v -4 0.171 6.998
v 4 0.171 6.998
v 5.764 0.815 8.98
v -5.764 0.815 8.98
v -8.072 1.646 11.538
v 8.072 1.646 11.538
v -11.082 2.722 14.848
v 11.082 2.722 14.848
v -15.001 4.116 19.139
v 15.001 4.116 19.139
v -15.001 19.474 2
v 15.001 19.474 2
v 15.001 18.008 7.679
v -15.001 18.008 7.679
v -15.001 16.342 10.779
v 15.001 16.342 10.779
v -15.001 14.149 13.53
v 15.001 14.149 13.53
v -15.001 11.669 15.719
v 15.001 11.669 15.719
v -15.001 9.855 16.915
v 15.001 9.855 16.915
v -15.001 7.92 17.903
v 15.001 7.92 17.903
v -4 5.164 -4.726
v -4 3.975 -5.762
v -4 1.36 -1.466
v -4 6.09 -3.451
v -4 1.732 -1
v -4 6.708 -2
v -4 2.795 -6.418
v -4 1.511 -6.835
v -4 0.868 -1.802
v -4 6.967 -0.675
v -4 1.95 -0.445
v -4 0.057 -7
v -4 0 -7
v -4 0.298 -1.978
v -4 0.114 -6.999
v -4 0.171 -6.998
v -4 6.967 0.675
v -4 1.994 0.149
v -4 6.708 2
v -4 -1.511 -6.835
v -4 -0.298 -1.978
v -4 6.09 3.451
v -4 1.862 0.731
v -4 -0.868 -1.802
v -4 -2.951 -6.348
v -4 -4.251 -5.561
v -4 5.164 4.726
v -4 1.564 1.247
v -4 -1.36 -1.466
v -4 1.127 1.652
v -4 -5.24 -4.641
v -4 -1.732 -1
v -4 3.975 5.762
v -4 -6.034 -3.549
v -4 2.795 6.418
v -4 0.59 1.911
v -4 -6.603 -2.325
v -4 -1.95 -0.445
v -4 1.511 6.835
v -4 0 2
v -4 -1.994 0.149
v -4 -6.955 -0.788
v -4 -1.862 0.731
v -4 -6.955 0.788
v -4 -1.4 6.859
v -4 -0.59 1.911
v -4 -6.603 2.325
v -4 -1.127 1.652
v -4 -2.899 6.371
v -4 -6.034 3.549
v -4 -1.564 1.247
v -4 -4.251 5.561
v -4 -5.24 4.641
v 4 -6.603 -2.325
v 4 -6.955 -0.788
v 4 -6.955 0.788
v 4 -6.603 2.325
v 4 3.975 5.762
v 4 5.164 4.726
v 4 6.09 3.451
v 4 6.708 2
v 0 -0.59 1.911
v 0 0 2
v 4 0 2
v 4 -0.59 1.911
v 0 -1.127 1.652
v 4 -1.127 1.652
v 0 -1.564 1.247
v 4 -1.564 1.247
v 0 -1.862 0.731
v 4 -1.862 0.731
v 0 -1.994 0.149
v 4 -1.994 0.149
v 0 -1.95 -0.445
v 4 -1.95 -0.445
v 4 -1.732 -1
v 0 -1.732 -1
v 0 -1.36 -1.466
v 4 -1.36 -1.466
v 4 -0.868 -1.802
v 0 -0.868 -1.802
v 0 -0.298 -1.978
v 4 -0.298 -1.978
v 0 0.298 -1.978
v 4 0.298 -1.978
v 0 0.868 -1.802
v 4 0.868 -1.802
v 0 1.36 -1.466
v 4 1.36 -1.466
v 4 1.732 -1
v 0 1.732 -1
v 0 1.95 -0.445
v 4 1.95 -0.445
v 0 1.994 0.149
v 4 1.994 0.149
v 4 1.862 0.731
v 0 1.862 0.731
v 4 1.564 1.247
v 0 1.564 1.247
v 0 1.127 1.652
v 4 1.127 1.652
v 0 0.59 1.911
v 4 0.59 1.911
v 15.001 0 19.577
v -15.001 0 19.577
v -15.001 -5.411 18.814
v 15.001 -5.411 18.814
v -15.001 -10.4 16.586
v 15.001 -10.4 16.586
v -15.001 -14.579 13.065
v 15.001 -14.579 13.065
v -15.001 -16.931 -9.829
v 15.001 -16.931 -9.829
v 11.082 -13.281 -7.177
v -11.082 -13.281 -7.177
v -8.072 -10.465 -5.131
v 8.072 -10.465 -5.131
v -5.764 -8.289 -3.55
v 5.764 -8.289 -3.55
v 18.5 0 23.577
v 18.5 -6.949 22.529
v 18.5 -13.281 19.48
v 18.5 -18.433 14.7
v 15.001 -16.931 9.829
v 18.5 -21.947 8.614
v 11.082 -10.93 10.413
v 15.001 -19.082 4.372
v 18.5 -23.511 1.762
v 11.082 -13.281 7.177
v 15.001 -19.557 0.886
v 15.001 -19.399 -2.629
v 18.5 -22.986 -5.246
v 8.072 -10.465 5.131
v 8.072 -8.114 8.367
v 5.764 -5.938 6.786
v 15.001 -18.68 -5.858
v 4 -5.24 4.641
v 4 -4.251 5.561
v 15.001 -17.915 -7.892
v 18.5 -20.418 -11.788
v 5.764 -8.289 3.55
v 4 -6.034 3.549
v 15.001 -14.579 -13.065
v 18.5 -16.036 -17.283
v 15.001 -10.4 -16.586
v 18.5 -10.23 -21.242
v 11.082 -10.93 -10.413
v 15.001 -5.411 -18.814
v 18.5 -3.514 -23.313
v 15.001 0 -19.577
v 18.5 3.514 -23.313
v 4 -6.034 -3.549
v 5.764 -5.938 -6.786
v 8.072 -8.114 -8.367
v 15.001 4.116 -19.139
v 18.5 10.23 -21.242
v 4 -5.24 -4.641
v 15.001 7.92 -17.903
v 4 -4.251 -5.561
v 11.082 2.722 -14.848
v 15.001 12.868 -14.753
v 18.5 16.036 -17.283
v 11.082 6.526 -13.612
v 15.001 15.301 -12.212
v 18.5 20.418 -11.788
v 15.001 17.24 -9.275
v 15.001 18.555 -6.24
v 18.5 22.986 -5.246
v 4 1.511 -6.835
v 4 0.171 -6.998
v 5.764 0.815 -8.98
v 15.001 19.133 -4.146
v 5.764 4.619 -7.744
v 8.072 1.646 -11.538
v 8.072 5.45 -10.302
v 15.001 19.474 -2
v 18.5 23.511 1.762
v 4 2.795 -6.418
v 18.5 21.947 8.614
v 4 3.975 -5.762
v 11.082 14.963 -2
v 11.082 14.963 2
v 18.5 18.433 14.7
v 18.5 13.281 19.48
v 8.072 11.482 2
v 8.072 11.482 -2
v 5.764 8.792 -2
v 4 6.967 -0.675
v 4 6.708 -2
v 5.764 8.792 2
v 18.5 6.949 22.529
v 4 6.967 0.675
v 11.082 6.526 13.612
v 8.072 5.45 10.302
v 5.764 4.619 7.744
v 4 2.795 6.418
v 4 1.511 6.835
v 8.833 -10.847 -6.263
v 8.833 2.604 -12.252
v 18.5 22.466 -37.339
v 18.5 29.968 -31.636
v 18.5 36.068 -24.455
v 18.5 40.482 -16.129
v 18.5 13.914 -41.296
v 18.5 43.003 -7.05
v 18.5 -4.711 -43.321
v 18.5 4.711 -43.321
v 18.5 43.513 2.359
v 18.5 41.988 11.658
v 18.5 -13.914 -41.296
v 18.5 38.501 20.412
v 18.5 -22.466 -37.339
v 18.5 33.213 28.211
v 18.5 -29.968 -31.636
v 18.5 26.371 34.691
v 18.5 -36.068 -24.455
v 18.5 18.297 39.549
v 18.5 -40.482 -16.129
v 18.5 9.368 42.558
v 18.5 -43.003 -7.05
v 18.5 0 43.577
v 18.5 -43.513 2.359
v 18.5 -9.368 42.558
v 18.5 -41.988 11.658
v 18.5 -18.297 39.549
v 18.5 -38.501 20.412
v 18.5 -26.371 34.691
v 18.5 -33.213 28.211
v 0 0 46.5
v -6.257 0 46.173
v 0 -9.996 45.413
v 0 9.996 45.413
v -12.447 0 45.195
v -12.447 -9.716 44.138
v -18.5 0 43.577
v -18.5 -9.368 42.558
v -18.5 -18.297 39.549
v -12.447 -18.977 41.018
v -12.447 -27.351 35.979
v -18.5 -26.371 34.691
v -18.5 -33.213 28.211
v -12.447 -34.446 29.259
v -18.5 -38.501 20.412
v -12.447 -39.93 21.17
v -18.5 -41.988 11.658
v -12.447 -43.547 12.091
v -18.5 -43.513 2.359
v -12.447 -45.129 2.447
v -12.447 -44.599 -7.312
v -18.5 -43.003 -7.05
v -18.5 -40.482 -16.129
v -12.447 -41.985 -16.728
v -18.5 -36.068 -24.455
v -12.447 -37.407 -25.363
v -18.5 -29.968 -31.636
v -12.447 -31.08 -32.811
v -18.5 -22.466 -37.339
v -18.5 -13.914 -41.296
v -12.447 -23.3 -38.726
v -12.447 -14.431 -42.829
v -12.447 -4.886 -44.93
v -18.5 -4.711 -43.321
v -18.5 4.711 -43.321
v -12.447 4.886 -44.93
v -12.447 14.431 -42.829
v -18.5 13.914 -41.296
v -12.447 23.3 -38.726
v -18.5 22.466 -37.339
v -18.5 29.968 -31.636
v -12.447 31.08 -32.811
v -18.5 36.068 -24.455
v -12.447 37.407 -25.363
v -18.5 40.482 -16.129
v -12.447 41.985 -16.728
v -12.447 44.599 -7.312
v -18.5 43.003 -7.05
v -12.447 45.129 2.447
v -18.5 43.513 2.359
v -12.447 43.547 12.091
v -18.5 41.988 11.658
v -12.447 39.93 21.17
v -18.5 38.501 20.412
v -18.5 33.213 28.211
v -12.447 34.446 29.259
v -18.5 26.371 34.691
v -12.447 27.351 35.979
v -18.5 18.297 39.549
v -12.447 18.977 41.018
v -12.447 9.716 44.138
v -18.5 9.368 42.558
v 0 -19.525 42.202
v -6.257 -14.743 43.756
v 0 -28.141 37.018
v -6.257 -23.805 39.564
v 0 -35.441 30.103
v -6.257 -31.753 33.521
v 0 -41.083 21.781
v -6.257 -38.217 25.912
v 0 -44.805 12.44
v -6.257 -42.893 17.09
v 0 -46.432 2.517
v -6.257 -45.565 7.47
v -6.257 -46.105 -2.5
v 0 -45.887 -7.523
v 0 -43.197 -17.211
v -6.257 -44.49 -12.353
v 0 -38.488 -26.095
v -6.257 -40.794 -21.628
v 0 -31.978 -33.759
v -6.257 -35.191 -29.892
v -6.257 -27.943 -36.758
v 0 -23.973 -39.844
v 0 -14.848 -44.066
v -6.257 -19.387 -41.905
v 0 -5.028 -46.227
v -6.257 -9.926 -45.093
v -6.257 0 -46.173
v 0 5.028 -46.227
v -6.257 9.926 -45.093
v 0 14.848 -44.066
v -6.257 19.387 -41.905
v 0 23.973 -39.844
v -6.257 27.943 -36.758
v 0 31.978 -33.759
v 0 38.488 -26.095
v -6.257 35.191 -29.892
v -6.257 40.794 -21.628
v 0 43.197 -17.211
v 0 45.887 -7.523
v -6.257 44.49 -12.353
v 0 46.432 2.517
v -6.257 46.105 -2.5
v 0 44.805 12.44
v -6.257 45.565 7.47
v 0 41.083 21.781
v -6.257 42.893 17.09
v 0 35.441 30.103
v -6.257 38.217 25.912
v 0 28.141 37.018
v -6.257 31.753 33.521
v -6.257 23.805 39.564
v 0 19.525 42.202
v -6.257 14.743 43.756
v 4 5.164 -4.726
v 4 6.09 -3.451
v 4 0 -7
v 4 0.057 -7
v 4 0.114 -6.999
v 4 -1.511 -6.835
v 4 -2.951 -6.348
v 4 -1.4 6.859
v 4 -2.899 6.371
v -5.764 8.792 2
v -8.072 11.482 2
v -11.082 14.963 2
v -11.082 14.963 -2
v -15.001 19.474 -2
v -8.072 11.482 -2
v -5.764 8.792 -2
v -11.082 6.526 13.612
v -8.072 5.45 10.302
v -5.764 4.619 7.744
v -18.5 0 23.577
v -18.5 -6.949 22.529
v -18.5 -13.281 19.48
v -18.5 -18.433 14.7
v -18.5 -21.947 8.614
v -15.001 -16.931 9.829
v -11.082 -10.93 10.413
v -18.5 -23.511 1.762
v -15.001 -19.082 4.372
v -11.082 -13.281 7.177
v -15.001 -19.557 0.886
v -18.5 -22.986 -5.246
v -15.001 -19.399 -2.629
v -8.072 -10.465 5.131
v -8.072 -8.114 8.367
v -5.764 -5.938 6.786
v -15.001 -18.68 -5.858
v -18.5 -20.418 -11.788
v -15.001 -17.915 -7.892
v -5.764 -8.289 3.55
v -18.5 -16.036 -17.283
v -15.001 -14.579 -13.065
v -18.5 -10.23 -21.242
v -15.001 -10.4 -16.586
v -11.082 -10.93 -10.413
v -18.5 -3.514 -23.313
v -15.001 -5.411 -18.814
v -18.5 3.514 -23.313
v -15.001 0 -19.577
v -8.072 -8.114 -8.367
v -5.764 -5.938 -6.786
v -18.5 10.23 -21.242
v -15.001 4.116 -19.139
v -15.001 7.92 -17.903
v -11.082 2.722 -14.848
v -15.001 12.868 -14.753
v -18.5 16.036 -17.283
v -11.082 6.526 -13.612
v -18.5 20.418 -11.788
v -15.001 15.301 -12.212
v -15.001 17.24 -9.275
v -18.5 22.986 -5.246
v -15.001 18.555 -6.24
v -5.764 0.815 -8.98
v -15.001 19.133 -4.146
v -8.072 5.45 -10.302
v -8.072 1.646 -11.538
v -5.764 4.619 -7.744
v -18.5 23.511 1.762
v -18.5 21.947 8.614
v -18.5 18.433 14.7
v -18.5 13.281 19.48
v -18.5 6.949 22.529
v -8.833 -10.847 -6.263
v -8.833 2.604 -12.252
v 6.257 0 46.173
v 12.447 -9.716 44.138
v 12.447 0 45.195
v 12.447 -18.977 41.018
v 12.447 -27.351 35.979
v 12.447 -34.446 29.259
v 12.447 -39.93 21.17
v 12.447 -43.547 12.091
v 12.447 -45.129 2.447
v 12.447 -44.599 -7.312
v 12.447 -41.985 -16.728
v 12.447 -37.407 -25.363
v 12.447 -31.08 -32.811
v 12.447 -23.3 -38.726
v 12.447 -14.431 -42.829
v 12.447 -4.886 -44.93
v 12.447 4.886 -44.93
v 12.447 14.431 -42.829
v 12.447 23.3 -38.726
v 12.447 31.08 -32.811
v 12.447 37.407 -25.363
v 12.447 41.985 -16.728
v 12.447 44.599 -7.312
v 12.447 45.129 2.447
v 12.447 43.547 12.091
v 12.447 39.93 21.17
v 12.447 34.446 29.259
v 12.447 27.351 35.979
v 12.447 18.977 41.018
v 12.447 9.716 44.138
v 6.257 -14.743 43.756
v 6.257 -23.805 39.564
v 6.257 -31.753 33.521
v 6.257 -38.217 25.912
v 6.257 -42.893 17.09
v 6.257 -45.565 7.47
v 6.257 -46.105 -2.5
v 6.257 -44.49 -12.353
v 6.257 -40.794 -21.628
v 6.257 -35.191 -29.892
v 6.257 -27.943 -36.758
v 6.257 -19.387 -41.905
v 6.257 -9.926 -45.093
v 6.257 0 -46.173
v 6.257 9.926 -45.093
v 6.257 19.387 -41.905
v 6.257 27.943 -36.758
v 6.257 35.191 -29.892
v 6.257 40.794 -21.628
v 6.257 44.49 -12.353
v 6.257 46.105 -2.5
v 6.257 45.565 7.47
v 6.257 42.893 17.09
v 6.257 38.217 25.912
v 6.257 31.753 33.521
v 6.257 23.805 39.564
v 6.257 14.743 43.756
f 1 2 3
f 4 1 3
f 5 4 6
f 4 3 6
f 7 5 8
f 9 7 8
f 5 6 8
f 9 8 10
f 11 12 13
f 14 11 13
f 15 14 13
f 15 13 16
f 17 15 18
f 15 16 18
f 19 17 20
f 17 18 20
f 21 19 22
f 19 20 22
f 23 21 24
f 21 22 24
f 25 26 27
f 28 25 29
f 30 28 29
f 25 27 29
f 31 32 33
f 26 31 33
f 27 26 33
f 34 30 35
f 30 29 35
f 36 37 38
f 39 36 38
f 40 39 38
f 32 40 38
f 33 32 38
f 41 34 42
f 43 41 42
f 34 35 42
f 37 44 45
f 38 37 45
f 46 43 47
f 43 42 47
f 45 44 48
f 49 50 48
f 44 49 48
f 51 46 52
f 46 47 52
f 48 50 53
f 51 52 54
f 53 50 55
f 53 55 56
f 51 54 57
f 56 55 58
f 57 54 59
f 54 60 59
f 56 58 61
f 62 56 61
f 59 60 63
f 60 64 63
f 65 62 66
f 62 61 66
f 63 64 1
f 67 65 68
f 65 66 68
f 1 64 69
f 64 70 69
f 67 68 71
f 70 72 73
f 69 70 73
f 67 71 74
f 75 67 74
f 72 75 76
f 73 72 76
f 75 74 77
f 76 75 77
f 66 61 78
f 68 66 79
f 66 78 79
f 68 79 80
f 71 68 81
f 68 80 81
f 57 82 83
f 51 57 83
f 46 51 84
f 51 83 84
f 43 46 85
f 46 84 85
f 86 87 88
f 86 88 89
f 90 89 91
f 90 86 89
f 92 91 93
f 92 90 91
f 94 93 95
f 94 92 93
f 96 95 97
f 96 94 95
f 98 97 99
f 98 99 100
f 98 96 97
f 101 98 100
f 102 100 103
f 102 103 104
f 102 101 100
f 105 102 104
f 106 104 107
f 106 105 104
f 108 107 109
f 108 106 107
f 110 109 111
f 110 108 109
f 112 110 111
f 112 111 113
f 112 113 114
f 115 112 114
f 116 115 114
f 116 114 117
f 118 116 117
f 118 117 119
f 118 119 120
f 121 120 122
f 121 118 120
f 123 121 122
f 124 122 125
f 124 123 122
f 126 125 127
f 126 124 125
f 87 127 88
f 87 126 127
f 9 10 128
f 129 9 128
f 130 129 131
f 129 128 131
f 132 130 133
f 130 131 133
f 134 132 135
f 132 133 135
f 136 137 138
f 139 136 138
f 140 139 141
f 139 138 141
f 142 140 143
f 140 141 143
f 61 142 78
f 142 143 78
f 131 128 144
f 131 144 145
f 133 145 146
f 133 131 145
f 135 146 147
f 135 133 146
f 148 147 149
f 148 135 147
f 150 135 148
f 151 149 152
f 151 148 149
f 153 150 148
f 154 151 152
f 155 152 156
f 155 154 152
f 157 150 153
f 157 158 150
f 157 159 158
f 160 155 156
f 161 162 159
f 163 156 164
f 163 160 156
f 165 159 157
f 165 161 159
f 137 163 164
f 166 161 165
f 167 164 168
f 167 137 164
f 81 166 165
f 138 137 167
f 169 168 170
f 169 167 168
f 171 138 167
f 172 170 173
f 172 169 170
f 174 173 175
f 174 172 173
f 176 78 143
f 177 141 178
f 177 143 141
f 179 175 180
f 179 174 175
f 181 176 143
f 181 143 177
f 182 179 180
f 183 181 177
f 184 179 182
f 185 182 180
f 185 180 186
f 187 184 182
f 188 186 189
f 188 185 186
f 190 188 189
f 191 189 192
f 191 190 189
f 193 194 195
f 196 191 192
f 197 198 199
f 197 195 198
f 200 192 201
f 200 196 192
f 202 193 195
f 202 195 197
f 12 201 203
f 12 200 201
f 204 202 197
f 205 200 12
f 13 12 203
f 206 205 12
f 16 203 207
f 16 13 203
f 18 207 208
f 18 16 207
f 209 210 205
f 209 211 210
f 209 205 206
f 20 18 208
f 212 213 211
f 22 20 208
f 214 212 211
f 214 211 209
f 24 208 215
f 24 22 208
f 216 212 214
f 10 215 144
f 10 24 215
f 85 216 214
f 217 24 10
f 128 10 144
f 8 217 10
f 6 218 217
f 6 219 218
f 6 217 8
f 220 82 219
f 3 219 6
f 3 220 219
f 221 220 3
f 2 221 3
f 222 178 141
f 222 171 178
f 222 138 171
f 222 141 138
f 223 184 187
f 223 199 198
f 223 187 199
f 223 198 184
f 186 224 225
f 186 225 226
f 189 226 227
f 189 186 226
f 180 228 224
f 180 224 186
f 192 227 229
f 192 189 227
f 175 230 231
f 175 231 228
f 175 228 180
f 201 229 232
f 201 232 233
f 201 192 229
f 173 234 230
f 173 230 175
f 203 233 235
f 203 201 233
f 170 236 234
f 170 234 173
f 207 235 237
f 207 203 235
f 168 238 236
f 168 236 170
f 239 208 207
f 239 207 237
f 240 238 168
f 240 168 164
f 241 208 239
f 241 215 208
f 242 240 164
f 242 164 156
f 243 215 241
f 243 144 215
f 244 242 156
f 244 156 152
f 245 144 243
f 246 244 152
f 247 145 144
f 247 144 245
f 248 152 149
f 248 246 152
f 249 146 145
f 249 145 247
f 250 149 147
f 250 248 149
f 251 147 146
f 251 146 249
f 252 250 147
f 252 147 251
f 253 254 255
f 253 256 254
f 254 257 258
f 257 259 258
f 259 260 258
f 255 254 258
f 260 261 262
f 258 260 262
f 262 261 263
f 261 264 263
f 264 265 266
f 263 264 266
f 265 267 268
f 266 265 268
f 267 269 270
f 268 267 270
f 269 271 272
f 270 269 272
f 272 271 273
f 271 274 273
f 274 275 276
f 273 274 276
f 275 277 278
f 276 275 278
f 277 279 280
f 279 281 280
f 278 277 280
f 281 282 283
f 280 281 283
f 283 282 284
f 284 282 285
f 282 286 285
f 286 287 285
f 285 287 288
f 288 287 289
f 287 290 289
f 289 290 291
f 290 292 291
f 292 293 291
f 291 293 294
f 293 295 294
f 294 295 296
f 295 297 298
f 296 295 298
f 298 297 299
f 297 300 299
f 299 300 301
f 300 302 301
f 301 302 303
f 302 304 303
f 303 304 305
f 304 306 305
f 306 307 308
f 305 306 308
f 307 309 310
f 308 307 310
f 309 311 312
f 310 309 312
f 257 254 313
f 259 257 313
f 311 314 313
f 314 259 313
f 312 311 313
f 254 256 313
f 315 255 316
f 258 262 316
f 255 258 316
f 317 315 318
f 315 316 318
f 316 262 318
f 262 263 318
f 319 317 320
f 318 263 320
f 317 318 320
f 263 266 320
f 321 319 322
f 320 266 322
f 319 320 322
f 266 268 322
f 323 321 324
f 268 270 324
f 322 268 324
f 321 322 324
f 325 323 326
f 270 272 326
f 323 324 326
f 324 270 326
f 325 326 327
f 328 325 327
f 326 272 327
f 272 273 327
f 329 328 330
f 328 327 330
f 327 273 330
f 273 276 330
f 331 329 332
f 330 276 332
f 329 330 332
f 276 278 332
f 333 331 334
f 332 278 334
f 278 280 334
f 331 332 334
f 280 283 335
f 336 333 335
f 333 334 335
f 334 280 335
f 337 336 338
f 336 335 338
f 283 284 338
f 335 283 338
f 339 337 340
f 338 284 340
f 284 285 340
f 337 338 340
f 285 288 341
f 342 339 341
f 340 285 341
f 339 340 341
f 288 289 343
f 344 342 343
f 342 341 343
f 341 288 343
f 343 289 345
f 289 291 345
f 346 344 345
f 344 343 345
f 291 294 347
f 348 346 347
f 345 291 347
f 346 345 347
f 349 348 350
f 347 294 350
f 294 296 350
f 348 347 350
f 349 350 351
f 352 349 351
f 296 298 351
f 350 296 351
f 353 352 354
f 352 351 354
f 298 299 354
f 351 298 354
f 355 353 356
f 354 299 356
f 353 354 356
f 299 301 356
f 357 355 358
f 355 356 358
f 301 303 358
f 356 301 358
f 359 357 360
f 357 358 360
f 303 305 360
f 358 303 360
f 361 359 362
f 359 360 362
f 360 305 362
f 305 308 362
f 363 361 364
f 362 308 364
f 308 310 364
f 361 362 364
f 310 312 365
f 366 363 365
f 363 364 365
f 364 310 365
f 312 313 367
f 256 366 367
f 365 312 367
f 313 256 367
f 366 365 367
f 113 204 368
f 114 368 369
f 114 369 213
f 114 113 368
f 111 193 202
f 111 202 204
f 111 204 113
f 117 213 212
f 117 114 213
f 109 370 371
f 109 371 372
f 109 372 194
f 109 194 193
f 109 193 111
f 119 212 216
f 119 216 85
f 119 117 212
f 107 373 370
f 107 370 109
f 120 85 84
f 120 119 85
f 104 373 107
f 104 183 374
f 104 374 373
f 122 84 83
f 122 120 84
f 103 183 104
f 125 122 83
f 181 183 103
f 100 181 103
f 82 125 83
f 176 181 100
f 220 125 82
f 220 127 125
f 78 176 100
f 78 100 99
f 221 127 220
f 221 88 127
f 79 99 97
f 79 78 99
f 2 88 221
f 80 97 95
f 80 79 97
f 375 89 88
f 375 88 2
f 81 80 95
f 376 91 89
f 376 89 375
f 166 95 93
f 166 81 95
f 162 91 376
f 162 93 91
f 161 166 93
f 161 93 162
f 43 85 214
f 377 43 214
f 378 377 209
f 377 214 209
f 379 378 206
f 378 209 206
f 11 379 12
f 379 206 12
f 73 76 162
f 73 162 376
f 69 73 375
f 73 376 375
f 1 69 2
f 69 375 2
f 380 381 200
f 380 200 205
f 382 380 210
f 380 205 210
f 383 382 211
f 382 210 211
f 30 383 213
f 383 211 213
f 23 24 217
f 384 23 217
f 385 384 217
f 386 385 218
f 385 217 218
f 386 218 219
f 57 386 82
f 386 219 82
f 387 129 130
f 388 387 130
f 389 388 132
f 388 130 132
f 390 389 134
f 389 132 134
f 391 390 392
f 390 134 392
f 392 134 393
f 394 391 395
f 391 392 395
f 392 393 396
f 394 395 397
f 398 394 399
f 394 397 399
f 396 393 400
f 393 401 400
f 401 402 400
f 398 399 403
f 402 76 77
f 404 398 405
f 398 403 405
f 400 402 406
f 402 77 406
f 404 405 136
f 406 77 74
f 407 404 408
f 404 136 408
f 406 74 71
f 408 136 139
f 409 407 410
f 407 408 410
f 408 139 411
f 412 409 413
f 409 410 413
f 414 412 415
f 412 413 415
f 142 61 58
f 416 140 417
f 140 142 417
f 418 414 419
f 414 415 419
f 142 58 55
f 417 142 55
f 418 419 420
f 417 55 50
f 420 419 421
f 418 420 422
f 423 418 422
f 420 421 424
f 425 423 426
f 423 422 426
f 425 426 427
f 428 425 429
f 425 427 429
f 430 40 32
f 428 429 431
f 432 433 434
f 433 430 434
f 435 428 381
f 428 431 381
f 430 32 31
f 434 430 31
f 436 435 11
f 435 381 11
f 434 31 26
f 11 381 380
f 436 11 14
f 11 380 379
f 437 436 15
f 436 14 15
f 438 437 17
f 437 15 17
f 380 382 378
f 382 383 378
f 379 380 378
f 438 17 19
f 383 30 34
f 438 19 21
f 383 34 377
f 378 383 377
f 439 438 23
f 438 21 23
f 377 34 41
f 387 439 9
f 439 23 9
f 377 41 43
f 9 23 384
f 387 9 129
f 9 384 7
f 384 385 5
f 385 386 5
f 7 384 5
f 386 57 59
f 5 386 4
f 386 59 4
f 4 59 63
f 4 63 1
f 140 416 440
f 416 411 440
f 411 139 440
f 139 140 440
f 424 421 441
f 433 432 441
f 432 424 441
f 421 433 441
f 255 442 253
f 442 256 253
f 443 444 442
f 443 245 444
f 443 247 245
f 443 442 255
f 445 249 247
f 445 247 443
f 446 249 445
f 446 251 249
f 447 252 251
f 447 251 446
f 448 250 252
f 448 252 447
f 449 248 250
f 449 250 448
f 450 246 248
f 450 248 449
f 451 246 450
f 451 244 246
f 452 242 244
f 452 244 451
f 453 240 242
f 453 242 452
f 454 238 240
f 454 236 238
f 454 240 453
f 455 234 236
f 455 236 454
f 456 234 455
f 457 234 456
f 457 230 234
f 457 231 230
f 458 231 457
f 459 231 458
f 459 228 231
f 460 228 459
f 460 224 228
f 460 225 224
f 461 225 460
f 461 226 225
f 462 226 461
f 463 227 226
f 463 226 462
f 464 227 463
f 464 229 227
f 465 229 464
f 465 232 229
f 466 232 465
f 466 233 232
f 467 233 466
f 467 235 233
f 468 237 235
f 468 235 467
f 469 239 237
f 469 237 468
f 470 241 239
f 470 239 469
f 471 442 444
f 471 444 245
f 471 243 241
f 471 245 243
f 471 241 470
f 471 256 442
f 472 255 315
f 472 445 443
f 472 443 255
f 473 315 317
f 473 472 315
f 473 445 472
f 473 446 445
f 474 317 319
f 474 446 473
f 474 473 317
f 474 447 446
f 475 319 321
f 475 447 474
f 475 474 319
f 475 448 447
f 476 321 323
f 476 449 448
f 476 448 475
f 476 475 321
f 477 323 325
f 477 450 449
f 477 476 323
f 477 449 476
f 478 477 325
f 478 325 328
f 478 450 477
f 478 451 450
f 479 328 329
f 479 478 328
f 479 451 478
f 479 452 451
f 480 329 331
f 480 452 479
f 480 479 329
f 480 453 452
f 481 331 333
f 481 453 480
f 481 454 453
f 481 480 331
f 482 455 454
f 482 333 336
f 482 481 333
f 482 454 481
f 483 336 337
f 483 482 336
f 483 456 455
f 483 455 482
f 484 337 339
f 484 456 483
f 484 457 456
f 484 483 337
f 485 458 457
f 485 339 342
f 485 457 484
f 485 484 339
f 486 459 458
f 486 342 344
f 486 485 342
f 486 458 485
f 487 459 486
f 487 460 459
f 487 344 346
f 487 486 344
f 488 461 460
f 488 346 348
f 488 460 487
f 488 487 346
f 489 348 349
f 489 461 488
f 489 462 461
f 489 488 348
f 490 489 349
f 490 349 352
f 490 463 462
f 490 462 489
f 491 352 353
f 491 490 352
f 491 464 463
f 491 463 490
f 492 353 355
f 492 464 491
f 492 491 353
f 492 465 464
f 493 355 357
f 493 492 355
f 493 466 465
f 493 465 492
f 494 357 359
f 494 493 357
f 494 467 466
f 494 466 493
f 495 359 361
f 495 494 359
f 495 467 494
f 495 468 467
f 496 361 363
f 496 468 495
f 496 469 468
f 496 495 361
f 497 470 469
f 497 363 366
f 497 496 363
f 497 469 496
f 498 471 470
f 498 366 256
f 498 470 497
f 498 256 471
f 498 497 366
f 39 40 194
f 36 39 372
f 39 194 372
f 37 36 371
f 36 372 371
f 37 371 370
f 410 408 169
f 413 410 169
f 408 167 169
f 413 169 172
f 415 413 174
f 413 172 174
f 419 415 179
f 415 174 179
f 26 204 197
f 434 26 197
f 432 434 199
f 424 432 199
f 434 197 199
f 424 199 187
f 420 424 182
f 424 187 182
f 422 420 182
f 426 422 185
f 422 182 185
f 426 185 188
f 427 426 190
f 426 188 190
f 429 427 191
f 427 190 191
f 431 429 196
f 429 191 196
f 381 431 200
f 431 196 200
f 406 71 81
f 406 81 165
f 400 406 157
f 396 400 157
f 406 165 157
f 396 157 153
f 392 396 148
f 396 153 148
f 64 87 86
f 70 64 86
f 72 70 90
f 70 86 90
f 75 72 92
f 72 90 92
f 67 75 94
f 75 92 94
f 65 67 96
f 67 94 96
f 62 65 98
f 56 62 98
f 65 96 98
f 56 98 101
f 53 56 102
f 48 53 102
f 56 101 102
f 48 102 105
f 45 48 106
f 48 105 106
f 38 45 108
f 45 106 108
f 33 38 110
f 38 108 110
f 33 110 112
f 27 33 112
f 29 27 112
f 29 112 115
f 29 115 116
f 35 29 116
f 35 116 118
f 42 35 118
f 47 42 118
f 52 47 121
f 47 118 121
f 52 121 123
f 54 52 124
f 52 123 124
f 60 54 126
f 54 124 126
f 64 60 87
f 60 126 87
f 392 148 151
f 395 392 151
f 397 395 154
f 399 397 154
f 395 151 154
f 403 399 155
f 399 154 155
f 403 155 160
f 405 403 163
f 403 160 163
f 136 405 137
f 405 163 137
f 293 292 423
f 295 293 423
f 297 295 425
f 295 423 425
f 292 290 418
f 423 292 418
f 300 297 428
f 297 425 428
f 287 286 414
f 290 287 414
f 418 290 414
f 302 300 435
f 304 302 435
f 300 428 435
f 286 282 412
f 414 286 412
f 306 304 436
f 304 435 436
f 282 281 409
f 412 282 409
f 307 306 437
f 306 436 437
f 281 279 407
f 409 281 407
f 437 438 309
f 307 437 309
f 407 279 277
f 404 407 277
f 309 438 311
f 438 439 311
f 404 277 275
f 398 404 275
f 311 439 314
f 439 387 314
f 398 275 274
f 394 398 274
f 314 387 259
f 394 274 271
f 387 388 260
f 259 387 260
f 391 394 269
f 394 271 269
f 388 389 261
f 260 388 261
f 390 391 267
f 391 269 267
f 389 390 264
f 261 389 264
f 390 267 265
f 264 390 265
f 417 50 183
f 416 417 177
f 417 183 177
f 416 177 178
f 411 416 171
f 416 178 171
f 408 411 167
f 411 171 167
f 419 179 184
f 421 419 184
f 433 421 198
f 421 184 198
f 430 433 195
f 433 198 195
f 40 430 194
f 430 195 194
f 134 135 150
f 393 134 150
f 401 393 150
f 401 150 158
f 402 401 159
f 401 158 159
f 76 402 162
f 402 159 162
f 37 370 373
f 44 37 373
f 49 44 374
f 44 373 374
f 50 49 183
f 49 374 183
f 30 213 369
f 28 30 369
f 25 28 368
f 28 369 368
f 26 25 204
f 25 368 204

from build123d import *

# Parameters (mm, degrees)
CUT_EXTRUDE1_DEPTH      = 19.5000001
CUT_EXTRUDE1_DEPTH_BACK = 19.5000001


with BuildPart() as part:
    # Sketch1 → Revolve1 (revolve)
    with BuildSketch(Plane(origin=(0, 0, 0), x_dir=(1, 0, 0), z_dir=(0, 1, 0))):
        with BuildLine():
            Line((18.5, -43.576702778), (18.5, -23.576702778))
            Line((18.5, -23.576702778), (4, -7))
            Line((4, -7), (4, -2))
            Line((4, -2), (0, -2))
            Line((0, -2), (0, -46.5))
            ThreePointArc((0, -46.5), (9.364769974, -45.764669773), (18.5, -43.576702778))
        make_face()
    revolve(axis=Axis((-21.521301372, 0, 0), (1, 0, 0)))

    # Mirror1: part across plane


with BuildPart() as part_1:
    add(part.part)
    add(part.part.mirror(Plane(origin=(0, 0, 2), x_dir=(0, 0, 1), z_dir=(-1, 0, 0))))

    # Sketch2 → Cut-Extrude1 (cut, two sides)
    with BuildSketch(Plane(origin=(0, 0, 0), x_dir=(0, 0, -1), z_dir=(1, 0, 0))) as cut_extrude1_sk:
        with BuildLine():
            ThreePointArc((-5.761847074, 3.975062049), (-4.114496766, 5.663118961), (-2, 6.708203932))
            Line((-2, 6.708203932), (-2, 19.474272558))
            ThreePointArc((-2, 19.474272558), (-11.506897181, 15.837885241), (-17.903099827, 7.919994206))
            Line((-17.903099827, 7.919994206), (-5.761847074, 3.975062049))
        make_face()
        with BuildLine():
            Line((2, 19.474272558), (2, 6.708203932))
            ThreePointArc((2, 6.708203932), (4.114496766, 5.663118961), (5.761847074, 3.975062049))
            Line((5.761847074, 3.975062049), (17.903099827, 7.919994206))
            ThreePointArc((17.903099827, 7.919994206), (11.506897181, 15.837885241), (2, 19.474272558))
        make_face()
        with BuildLine():
            Line((-13.064724197, -14.579446948), (-5.56101733, -4.251480479))
            ThreePointArc((-5.56101733, -4.251480479), (-6.657395614, -2.163118961), (-6.997915051, 0.170835984))
            Line((-6.997915051, 0.170835984), (-19.139167805, 4.115768141))
            ThreePointArc((-19.139167805, 4.115768141), (-18.618550745, -6.049533852), (-13.064724197, -14.579446948))
        make_face()
        with BuildLine():
            Line((19.139167805, 4.115768141), (6.997915051, 0.170835984))
            ThreePointArc((6.997915051, 0.170835984), (6.999478743, 0.085424353), (7, 0))
            ThreePointArc((7, 0), (6.630502293, -2.244201271), (5.56101733, -4.251480479))
            Line((5.56101733, -4.251480479), (13.064724197, -14.579446948))
            ThreePointArc((13.064724197, -14.579446948), (17.874723972, -7.983829569), (19.576702778, 0))
            ThreePointArc((19.576702778, 0), (19.467011727, 2.069479659), (19.139167805, 4.115768141))
        make_face()
        with BuildLine():
            Line((9.82865622, -16.930587957), (2.324949352, -6.602621488))
            ThreePointArc((2.324949352, -6.602621488), (0, -7), (-2.324949352, -6.602621488))
            Line((-2.324949352, -6.602621488), (-9.82865622, -16.930587957))
            ThreePointArc((-9.82865622, -16.930587957), (0, -19.576702778), (9.82865622, -16.930587957))
        make_face()
    extrude(amount=CUT_EXTRUDE1_DEPTH, mode=Mode.SUBTRACT)
    extrude(cut_extrude1_sk.sketch, amount=-CUT_EXTRUDE1_DEPTH_BACK, mode=Mode.SUBTRACT)


solid = part_1.part
